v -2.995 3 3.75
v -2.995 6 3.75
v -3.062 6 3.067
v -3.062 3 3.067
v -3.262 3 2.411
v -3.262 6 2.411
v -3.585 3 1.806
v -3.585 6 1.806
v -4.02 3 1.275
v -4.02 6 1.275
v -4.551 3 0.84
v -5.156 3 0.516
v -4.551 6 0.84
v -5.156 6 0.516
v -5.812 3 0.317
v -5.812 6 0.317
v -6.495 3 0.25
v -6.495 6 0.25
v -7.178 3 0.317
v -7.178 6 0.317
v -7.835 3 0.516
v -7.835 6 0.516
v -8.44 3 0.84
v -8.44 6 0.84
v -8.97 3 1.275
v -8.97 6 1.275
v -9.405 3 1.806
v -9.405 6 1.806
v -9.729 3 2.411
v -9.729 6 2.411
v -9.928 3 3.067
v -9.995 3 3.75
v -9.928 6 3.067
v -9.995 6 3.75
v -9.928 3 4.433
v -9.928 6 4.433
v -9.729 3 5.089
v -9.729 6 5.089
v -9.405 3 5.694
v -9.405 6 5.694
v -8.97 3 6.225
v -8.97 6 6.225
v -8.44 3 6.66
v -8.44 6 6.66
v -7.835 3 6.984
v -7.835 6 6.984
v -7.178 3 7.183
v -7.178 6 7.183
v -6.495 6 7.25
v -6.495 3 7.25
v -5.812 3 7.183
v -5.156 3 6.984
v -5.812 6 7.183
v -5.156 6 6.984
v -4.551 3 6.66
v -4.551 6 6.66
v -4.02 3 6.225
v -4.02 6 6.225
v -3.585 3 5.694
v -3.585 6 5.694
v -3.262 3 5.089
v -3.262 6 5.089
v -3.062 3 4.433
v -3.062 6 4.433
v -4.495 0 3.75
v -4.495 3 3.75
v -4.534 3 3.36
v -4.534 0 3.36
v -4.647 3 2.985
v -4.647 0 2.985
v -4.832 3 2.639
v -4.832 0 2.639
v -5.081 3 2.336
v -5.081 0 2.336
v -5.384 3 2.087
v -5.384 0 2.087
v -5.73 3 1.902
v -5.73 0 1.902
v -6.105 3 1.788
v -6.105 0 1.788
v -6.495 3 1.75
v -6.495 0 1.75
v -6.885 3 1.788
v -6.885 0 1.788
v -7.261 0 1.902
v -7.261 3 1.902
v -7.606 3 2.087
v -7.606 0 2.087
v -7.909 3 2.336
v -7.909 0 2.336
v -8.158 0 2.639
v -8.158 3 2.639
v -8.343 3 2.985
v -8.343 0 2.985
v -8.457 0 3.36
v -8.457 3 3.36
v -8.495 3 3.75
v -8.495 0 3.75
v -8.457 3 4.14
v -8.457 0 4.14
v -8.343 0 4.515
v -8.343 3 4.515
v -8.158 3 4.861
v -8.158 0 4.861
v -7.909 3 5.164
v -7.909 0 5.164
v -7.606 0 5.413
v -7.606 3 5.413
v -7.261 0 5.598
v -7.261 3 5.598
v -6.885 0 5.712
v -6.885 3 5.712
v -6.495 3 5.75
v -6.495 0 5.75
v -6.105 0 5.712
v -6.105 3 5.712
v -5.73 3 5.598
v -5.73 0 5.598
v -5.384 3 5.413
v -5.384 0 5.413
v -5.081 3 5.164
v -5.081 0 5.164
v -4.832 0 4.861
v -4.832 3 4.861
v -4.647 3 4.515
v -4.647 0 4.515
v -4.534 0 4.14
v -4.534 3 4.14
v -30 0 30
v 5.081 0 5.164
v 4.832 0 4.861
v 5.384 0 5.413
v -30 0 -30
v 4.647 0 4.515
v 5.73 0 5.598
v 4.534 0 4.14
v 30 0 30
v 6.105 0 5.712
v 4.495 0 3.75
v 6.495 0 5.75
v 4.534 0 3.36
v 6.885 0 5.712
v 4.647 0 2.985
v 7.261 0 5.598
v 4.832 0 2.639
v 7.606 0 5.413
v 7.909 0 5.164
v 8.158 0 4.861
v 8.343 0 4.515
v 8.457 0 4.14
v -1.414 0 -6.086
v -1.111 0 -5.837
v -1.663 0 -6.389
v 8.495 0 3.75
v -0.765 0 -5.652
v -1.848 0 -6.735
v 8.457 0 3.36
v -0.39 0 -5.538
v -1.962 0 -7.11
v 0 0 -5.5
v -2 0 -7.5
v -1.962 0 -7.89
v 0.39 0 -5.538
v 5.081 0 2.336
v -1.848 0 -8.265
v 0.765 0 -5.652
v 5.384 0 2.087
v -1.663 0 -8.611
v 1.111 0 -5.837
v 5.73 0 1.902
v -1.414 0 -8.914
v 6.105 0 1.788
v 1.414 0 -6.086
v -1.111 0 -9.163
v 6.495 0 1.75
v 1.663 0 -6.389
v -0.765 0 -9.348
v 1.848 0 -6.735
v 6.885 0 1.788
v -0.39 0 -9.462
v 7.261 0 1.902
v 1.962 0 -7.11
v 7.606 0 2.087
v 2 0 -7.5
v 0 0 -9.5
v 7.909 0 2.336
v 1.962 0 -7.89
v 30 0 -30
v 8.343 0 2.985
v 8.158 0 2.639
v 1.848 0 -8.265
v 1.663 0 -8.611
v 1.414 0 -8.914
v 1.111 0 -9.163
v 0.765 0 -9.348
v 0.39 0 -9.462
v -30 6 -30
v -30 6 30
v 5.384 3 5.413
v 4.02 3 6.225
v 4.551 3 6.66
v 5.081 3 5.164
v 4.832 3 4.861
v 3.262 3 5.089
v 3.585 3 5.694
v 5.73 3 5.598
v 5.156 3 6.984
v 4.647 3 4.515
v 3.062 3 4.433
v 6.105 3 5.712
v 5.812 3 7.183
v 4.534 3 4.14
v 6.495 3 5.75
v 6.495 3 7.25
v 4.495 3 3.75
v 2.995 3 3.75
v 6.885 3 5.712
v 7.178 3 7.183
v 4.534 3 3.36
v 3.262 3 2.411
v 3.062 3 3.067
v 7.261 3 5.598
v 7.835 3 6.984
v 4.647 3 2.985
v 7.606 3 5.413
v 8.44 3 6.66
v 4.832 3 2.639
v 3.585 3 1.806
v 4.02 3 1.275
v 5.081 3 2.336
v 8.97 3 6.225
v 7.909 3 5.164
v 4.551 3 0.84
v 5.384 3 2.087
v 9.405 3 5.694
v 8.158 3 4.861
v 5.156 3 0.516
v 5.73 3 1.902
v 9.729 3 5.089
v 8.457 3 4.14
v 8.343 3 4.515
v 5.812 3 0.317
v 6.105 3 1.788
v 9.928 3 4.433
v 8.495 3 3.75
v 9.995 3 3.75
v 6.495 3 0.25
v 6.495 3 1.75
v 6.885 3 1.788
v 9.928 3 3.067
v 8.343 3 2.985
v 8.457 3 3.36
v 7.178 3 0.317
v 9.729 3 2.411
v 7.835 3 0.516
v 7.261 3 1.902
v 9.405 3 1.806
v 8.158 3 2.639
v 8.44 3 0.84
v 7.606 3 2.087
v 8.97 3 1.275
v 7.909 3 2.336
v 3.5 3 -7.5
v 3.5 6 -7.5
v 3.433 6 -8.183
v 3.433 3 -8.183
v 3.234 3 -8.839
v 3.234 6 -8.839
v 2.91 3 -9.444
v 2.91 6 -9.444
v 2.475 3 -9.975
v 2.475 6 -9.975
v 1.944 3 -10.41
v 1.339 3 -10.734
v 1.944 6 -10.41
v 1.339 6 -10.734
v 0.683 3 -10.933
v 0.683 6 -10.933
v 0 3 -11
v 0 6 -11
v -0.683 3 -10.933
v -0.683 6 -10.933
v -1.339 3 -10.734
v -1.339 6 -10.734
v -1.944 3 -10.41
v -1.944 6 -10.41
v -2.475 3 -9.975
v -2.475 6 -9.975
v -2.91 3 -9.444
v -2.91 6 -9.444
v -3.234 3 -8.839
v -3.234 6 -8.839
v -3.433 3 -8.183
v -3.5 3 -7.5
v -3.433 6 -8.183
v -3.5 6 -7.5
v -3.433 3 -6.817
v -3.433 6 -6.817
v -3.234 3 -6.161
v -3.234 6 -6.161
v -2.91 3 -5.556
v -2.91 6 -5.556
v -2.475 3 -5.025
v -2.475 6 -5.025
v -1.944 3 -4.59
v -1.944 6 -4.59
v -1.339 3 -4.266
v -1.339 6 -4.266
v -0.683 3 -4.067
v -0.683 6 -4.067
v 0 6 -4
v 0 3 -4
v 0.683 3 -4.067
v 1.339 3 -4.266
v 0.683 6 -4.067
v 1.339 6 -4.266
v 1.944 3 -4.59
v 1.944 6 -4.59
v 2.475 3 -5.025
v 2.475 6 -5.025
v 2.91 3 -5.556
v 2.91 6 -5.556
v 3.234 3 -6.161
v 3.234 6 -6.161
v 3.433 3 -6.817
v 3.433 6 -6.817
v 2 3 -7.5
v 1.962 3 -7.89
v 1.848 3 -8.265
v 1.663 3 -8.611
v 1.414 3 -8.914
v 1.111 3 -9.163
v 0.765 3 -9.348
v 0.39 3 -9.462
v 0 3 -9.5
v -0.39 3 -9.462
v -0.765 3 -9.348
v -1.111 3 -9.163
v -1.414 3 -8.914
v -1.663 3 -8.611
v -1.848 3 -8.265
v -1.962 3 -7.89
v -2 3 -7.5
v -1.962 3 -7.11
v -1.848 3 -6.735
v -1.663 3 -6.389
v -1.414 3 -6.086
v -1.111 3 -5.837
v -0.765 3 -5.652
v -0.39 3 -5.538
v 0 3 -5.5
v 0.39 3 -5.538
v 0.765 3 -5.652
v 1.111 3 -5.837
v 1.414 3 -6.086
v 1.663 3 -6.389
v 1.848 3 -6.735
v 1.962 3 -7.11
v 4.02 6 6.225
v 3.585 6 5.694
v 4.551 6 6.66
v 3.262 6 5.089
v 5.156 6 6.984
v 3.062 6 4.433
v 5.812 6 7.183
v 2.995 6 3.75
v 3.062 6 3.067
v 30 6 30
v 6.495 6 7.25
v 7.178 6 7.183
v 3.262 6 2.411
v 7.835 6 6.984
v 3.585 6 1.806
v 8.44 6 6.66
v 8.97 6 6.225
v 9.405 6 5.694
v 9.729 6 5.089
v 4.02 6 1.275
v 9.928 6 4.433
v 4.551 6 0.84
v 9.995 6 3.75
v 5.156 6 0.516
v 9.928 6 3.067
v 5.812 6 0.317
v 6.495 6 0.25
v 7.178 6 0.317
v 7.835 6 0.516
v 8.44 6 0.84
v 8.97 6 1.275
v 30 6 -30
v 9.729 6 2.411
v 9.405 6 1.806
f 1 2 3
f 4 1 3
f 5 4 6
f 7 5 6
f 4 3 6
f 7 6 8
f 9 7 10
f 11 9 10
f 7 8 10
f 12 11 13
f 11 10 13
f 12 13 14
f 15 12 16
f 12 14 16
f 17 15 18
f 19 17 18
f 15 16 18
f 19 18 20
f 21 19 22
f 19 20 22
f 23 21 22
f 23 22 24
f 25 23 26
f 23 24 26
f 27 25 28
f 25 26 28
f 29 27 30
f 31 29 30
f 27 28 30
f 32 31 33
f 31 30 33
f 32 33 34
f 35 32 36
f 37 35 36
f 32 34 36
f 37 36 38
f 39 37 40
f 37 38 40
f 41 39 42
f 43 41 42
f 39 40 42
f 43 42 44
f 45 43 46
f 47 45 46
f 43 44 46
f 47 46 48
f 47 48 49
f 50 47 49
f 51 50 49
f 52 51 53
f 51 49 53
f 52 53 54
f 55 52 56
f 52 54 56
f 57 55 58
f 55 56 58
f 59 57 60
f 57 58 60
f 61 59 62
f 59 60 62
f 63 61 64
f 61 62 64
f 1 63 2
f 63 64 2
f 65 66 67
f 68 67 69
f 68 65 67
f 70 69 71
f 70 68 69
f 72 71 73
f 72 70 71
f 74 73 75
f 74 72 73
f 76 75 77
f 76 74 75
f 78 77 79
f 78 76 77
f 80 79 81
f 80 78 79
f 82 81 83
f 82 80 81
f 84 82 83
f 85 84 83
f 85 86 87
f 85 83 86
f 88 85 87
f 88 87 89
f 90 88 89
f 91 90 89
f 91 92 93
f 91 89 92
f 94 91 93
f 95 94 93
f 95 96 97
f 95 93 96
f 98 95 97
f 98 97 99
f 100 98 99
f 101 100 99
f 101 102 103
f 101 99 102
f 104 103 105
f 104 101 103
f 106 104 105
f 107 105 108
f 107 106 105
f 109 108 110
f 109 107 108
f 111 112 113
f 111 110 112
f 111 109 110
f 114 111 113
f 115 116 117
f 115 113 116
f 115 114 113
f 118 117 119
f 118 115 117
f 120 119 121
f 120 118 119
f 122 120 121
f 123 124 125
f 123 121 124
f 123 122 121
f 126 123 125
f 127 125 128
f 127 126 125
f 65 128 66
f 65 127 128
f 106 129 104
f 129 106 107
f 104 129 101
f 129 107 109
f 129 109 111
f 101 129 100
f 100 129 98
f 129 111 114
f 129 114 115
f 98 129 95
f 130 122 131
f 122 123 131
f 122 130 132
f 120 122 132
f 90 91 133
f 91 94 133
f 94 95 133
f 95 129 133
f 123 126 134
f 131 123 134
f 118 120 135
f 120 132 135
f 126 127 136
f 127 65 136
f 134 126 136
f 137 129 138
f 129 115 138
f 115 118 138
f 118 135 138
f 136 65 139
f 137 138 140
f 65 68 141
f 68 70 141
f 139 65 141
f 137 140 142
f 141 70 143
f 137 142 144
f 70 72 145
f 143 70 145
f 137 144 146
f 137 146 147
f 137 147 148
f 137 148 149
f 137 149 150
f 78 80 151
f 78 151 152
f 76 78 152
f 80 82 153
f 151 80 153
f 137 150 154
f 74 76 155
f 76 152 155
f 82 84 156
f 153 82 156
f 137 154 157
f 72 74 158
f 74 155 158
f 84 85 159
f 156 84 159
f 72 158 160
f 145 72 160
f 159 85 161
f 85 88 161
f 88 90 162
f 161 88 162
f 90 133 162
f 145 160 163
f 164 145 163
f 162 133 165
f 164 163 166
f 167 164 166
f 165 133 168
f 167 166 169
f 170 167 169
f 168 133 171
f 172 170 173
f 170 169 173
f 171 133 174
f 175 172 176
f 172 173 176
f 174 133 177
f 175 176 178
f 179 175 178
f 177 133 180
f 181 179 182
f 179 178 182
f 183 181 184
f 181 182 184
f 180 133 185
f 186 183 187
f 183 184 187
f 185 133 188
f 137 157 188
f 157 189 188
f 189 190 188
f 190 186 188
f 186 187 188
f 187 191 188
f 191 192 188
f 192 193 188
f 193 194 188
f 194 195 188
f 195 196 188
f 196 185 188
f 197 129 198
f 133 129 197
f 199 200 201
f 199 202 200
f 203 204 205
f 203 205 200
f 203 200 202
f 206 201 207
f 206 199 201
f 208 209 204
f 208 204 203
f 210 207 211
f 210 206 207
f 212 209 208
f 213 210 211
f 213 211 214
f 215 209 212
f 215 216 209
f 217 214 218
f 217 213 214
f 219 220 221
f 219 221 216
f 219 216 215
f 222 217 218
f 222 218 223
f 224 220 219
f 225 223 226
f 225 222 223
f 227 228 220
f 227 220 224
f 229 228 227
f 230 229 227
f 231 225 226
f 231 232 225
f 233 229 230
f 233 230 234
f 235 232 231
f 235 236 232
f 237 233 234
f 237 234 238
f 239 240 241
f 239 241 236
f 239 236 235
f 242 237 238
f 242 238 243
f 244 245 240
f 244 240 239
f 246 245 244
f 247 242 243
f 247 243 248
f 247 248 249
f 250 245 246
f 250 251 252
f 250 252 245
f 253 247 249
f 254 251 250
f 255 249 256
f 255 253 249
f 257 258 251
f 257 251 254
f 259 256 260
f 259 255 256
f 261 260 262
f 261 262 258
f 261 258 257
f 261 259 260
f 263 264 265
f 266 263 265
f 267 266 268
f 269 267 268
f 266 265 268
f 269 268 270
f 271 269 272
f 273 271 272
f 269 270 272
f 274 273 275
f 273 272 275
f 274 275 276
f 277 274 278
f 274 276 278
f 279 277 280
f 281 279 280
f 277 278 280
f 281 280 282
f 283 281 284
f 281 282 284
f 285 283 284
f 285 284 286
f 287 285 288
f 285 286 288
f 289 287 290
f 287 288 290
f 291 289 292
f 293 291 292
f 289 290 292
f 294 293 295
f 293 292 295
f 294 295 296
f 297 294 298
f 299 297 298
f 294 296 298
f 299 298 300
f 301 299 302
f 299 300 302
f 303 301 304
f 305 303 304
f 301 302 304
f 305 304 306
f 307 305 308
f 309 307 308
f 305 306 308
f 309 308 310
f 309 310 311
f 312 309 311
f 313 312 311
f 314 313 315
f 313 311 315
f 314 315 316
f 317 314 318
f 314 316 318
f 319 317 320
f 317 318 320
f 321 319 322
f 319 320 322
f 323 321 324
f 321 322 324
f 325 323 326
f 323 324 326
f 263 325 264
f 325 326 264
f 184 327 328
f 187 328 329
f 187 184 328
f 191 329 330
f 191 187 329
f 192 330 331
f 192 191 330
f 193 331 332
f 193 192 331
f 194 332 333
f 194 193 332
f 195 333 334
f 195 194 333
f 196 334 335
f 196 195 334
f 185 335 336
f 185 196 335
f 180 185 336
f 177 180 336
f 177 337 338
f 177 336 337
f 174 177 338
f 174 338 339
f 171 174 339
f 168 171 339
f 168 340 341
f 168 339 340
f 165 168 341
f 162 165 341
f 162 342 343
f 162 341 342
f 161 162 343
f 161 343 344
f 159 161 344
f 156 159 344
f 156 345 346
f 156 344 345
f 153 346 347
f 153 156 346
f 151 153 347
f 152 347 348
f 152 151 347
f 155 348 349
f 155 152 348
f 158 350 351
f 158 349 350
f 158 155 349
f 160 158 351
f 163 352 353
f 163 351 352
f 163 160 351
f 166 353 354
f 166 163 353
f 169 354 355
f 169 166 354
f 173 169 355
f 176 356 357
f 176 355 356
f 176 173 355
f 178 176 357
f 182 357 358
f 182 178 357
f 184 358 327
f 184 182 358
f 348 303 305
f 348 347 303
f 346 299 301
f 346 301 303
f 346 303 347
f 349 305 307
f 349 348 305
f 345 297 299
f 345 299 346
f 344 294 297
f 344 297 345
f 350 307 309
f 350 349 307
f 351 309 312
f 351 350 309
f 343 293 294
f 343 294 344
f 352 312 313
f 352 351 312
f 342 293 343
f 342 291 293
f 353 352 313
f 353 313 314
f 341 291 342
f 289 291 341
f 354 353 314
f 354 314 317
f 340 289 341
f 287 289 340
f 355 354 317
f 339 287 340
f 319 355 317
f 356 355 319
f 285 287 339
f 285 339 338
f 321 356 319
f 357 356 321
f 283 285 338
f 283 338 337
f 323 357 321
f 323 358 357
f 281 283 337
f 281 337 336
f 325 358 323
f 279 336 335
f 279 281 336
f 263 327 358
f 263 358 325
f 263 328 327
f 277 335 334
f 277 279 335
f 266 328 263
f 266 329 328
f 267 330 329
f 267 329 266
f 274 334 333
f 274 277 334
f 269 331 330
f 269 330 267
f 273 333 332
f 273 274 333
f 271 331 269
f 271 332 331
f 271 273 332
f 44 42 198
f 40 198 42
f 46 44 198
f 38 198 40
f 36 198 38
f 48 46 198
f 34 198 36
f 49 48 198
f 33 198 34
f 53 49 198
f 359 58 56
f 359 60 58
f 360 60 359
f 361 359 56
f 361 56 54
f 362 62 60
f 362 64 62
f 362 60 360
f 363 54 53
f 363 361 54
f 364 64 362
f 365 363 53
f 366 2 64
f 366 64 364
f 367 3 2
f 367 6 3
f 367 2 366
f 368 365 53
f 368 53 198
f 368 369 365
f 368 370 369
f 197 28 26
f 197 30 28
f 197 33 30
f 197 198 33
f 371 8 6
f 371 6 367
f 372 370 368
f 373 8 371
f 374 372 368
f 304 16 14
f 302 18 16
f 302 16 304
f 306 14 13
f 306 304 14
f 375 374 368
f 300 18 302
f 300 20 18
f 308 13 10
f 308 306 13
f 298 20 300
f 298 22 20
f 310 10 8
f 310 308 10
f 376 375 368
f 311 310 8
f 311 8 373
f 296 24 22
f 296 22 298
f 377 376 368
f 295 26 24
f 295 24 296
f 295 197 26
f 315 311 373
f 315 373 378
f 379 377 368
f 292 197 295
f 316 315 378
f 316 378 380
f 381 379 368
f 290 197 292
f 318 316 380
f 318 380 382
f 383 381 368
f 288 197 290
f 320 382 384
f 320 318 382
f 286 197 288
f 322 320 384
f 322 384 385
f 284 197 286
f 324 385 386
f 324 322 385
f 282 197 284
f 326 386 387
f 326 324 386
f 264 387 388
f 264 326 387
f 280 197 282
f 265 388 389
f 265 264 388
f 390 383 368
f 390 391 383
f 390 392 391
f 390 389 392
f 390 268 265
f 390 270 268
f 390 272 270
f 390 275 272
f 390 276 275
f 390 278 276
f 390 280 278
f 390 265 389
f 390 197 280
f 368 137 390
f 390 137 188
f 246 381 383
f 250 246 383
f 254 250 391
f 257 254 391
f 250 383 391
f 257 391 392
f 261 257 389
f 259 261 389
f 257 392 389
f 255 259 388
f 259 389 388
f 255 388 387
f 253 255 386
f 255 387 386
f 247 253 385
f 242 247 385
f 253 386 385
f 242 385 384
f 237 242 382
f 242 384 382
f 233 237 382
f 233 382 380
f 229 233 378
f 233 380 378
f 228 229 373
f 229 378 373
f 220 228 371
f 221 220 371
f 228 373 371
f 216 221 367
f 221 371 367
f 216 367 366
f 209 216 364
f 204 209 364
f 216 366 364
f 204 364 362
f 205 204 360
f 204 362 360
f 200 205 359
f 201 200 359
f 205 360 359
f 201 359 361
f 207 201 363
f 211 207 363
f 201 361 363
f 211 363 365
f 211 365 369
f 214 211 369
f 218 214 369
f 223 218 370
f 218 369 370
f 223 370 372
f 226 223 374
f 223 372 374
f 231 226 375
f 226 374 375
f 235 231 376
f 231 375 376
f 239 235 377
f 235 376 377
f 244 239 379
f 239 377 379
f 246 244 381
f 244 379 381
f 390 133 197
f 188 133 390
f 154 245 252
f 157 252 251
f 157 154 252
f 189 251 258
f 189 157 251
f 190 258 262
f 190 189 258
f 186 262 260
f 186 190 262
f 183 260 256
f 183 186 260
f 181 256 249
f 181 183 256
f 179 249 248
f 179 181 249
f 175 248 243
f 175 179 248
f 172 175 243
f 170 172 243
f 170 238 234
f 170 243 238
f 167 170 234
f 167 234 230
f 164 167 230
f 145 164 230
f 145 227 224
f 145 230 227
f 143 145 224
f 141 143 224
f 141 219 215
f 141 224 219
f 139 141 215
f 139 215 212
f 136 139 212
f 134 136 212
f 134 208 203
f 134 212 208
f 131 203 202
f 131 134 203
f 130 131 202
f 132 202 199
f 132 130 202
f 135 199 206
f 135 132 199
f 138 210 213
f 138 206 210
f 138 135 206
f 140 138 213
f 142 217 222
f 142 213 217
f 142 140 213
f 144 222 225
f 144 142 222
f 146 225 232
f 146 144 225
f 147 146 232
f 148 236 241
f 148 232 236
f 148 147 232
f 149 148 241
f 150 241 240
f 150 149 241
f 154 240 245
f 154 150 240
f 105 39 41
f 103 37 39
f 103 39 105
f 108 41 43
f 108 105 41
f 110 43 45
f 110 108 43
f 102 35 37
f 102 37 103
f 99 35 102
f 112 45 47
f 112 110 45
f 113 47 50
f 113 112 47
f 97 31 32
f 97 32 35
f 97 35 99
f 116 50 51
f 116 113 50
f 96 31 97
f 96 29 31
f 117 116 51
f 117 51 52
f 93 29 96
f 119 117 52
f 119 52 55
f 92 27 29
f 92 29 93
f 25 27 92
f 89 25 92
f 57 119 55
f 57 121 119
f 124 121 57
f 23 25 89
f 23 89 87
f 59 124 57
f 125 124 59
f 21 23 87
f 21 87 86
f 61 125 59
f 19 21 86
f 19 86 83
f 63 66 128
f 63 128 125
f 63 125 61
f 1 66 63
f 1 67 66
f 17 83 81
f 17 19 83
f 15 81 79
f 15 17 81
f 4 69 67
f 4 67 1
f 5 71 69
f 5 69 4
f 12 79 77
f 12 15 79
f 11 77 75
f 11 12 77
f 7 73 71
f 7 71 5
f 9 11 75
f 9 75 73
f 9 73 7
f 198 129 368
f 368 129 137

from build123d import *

# Parameters (mm, degrees)
SKETCH1_W           = 60
SKETCH1_H           = 60
BOSS_EXTRUDE2_DEPTH = 6
SKETCH1_4_R         = 2
CUT_EXTRUDE1_DEPTH  = 7
CUT_EXTRUDE2_START  = 6
SKETCH1_5_R         = 3.5
CUT_EXTRUDE2_DEPTH  = 3


with BuildPart() as part:
    # Sketch1 → Boss-Extrude2 (new body)
    with BuildSketch(Plane(origin=(0, 0, 0), x_dir=(1, 0, 0), z_dir=(0, 1, 0))):
        Rectangle(SKETCH1_W, SKETCH1_H)
    extrude(amount=BOSS_EXTRUDE2_DEPTH)

    # Sketch1<4> → Cut-Extrude1 (cut, through all)
    with BuildSketch(Plane(origin=(0, 0, 0), x_dir=(1, 0, 0), z_dir=(0, 1, 0))):
        with Locations((0, 7.5)):
            Circle(SKETCH1_4_R)
        with Locations((6.495190528, -3.75)):
            Circle(SKETCH1_4_R)
        with Locations((-6.495190528, -3.75)):
            Circle(SKETCH1_4_R)
    extrude(amount=CUT_EXTRUDE1_DEPTH, mode=Mode.SUBTRACT)

    # Sketch1<5> → Cut-Extrude2 (cut)
    with BuildSketch(Plane(origin=(0, 0, 0), x_dir=(1, 0, 0), z_dir=(0, 1, 0)).offset(CUT_EXTRUDE2_START)):
        with Locations((0, 7.5)):
            Circle(SKETCH1_5_R)
        with Locations((6.495190528, -3.75)):
            Circle(SKETCH1_5_R)
        with Locations((-6.495190528, -3.75)):
            Circle(SKETCH1_5_R)
    extrude(amount=-CUT_EXTRUDE2_DEPTH, mode=Mode.SUBTRACT)


solid = part.part
